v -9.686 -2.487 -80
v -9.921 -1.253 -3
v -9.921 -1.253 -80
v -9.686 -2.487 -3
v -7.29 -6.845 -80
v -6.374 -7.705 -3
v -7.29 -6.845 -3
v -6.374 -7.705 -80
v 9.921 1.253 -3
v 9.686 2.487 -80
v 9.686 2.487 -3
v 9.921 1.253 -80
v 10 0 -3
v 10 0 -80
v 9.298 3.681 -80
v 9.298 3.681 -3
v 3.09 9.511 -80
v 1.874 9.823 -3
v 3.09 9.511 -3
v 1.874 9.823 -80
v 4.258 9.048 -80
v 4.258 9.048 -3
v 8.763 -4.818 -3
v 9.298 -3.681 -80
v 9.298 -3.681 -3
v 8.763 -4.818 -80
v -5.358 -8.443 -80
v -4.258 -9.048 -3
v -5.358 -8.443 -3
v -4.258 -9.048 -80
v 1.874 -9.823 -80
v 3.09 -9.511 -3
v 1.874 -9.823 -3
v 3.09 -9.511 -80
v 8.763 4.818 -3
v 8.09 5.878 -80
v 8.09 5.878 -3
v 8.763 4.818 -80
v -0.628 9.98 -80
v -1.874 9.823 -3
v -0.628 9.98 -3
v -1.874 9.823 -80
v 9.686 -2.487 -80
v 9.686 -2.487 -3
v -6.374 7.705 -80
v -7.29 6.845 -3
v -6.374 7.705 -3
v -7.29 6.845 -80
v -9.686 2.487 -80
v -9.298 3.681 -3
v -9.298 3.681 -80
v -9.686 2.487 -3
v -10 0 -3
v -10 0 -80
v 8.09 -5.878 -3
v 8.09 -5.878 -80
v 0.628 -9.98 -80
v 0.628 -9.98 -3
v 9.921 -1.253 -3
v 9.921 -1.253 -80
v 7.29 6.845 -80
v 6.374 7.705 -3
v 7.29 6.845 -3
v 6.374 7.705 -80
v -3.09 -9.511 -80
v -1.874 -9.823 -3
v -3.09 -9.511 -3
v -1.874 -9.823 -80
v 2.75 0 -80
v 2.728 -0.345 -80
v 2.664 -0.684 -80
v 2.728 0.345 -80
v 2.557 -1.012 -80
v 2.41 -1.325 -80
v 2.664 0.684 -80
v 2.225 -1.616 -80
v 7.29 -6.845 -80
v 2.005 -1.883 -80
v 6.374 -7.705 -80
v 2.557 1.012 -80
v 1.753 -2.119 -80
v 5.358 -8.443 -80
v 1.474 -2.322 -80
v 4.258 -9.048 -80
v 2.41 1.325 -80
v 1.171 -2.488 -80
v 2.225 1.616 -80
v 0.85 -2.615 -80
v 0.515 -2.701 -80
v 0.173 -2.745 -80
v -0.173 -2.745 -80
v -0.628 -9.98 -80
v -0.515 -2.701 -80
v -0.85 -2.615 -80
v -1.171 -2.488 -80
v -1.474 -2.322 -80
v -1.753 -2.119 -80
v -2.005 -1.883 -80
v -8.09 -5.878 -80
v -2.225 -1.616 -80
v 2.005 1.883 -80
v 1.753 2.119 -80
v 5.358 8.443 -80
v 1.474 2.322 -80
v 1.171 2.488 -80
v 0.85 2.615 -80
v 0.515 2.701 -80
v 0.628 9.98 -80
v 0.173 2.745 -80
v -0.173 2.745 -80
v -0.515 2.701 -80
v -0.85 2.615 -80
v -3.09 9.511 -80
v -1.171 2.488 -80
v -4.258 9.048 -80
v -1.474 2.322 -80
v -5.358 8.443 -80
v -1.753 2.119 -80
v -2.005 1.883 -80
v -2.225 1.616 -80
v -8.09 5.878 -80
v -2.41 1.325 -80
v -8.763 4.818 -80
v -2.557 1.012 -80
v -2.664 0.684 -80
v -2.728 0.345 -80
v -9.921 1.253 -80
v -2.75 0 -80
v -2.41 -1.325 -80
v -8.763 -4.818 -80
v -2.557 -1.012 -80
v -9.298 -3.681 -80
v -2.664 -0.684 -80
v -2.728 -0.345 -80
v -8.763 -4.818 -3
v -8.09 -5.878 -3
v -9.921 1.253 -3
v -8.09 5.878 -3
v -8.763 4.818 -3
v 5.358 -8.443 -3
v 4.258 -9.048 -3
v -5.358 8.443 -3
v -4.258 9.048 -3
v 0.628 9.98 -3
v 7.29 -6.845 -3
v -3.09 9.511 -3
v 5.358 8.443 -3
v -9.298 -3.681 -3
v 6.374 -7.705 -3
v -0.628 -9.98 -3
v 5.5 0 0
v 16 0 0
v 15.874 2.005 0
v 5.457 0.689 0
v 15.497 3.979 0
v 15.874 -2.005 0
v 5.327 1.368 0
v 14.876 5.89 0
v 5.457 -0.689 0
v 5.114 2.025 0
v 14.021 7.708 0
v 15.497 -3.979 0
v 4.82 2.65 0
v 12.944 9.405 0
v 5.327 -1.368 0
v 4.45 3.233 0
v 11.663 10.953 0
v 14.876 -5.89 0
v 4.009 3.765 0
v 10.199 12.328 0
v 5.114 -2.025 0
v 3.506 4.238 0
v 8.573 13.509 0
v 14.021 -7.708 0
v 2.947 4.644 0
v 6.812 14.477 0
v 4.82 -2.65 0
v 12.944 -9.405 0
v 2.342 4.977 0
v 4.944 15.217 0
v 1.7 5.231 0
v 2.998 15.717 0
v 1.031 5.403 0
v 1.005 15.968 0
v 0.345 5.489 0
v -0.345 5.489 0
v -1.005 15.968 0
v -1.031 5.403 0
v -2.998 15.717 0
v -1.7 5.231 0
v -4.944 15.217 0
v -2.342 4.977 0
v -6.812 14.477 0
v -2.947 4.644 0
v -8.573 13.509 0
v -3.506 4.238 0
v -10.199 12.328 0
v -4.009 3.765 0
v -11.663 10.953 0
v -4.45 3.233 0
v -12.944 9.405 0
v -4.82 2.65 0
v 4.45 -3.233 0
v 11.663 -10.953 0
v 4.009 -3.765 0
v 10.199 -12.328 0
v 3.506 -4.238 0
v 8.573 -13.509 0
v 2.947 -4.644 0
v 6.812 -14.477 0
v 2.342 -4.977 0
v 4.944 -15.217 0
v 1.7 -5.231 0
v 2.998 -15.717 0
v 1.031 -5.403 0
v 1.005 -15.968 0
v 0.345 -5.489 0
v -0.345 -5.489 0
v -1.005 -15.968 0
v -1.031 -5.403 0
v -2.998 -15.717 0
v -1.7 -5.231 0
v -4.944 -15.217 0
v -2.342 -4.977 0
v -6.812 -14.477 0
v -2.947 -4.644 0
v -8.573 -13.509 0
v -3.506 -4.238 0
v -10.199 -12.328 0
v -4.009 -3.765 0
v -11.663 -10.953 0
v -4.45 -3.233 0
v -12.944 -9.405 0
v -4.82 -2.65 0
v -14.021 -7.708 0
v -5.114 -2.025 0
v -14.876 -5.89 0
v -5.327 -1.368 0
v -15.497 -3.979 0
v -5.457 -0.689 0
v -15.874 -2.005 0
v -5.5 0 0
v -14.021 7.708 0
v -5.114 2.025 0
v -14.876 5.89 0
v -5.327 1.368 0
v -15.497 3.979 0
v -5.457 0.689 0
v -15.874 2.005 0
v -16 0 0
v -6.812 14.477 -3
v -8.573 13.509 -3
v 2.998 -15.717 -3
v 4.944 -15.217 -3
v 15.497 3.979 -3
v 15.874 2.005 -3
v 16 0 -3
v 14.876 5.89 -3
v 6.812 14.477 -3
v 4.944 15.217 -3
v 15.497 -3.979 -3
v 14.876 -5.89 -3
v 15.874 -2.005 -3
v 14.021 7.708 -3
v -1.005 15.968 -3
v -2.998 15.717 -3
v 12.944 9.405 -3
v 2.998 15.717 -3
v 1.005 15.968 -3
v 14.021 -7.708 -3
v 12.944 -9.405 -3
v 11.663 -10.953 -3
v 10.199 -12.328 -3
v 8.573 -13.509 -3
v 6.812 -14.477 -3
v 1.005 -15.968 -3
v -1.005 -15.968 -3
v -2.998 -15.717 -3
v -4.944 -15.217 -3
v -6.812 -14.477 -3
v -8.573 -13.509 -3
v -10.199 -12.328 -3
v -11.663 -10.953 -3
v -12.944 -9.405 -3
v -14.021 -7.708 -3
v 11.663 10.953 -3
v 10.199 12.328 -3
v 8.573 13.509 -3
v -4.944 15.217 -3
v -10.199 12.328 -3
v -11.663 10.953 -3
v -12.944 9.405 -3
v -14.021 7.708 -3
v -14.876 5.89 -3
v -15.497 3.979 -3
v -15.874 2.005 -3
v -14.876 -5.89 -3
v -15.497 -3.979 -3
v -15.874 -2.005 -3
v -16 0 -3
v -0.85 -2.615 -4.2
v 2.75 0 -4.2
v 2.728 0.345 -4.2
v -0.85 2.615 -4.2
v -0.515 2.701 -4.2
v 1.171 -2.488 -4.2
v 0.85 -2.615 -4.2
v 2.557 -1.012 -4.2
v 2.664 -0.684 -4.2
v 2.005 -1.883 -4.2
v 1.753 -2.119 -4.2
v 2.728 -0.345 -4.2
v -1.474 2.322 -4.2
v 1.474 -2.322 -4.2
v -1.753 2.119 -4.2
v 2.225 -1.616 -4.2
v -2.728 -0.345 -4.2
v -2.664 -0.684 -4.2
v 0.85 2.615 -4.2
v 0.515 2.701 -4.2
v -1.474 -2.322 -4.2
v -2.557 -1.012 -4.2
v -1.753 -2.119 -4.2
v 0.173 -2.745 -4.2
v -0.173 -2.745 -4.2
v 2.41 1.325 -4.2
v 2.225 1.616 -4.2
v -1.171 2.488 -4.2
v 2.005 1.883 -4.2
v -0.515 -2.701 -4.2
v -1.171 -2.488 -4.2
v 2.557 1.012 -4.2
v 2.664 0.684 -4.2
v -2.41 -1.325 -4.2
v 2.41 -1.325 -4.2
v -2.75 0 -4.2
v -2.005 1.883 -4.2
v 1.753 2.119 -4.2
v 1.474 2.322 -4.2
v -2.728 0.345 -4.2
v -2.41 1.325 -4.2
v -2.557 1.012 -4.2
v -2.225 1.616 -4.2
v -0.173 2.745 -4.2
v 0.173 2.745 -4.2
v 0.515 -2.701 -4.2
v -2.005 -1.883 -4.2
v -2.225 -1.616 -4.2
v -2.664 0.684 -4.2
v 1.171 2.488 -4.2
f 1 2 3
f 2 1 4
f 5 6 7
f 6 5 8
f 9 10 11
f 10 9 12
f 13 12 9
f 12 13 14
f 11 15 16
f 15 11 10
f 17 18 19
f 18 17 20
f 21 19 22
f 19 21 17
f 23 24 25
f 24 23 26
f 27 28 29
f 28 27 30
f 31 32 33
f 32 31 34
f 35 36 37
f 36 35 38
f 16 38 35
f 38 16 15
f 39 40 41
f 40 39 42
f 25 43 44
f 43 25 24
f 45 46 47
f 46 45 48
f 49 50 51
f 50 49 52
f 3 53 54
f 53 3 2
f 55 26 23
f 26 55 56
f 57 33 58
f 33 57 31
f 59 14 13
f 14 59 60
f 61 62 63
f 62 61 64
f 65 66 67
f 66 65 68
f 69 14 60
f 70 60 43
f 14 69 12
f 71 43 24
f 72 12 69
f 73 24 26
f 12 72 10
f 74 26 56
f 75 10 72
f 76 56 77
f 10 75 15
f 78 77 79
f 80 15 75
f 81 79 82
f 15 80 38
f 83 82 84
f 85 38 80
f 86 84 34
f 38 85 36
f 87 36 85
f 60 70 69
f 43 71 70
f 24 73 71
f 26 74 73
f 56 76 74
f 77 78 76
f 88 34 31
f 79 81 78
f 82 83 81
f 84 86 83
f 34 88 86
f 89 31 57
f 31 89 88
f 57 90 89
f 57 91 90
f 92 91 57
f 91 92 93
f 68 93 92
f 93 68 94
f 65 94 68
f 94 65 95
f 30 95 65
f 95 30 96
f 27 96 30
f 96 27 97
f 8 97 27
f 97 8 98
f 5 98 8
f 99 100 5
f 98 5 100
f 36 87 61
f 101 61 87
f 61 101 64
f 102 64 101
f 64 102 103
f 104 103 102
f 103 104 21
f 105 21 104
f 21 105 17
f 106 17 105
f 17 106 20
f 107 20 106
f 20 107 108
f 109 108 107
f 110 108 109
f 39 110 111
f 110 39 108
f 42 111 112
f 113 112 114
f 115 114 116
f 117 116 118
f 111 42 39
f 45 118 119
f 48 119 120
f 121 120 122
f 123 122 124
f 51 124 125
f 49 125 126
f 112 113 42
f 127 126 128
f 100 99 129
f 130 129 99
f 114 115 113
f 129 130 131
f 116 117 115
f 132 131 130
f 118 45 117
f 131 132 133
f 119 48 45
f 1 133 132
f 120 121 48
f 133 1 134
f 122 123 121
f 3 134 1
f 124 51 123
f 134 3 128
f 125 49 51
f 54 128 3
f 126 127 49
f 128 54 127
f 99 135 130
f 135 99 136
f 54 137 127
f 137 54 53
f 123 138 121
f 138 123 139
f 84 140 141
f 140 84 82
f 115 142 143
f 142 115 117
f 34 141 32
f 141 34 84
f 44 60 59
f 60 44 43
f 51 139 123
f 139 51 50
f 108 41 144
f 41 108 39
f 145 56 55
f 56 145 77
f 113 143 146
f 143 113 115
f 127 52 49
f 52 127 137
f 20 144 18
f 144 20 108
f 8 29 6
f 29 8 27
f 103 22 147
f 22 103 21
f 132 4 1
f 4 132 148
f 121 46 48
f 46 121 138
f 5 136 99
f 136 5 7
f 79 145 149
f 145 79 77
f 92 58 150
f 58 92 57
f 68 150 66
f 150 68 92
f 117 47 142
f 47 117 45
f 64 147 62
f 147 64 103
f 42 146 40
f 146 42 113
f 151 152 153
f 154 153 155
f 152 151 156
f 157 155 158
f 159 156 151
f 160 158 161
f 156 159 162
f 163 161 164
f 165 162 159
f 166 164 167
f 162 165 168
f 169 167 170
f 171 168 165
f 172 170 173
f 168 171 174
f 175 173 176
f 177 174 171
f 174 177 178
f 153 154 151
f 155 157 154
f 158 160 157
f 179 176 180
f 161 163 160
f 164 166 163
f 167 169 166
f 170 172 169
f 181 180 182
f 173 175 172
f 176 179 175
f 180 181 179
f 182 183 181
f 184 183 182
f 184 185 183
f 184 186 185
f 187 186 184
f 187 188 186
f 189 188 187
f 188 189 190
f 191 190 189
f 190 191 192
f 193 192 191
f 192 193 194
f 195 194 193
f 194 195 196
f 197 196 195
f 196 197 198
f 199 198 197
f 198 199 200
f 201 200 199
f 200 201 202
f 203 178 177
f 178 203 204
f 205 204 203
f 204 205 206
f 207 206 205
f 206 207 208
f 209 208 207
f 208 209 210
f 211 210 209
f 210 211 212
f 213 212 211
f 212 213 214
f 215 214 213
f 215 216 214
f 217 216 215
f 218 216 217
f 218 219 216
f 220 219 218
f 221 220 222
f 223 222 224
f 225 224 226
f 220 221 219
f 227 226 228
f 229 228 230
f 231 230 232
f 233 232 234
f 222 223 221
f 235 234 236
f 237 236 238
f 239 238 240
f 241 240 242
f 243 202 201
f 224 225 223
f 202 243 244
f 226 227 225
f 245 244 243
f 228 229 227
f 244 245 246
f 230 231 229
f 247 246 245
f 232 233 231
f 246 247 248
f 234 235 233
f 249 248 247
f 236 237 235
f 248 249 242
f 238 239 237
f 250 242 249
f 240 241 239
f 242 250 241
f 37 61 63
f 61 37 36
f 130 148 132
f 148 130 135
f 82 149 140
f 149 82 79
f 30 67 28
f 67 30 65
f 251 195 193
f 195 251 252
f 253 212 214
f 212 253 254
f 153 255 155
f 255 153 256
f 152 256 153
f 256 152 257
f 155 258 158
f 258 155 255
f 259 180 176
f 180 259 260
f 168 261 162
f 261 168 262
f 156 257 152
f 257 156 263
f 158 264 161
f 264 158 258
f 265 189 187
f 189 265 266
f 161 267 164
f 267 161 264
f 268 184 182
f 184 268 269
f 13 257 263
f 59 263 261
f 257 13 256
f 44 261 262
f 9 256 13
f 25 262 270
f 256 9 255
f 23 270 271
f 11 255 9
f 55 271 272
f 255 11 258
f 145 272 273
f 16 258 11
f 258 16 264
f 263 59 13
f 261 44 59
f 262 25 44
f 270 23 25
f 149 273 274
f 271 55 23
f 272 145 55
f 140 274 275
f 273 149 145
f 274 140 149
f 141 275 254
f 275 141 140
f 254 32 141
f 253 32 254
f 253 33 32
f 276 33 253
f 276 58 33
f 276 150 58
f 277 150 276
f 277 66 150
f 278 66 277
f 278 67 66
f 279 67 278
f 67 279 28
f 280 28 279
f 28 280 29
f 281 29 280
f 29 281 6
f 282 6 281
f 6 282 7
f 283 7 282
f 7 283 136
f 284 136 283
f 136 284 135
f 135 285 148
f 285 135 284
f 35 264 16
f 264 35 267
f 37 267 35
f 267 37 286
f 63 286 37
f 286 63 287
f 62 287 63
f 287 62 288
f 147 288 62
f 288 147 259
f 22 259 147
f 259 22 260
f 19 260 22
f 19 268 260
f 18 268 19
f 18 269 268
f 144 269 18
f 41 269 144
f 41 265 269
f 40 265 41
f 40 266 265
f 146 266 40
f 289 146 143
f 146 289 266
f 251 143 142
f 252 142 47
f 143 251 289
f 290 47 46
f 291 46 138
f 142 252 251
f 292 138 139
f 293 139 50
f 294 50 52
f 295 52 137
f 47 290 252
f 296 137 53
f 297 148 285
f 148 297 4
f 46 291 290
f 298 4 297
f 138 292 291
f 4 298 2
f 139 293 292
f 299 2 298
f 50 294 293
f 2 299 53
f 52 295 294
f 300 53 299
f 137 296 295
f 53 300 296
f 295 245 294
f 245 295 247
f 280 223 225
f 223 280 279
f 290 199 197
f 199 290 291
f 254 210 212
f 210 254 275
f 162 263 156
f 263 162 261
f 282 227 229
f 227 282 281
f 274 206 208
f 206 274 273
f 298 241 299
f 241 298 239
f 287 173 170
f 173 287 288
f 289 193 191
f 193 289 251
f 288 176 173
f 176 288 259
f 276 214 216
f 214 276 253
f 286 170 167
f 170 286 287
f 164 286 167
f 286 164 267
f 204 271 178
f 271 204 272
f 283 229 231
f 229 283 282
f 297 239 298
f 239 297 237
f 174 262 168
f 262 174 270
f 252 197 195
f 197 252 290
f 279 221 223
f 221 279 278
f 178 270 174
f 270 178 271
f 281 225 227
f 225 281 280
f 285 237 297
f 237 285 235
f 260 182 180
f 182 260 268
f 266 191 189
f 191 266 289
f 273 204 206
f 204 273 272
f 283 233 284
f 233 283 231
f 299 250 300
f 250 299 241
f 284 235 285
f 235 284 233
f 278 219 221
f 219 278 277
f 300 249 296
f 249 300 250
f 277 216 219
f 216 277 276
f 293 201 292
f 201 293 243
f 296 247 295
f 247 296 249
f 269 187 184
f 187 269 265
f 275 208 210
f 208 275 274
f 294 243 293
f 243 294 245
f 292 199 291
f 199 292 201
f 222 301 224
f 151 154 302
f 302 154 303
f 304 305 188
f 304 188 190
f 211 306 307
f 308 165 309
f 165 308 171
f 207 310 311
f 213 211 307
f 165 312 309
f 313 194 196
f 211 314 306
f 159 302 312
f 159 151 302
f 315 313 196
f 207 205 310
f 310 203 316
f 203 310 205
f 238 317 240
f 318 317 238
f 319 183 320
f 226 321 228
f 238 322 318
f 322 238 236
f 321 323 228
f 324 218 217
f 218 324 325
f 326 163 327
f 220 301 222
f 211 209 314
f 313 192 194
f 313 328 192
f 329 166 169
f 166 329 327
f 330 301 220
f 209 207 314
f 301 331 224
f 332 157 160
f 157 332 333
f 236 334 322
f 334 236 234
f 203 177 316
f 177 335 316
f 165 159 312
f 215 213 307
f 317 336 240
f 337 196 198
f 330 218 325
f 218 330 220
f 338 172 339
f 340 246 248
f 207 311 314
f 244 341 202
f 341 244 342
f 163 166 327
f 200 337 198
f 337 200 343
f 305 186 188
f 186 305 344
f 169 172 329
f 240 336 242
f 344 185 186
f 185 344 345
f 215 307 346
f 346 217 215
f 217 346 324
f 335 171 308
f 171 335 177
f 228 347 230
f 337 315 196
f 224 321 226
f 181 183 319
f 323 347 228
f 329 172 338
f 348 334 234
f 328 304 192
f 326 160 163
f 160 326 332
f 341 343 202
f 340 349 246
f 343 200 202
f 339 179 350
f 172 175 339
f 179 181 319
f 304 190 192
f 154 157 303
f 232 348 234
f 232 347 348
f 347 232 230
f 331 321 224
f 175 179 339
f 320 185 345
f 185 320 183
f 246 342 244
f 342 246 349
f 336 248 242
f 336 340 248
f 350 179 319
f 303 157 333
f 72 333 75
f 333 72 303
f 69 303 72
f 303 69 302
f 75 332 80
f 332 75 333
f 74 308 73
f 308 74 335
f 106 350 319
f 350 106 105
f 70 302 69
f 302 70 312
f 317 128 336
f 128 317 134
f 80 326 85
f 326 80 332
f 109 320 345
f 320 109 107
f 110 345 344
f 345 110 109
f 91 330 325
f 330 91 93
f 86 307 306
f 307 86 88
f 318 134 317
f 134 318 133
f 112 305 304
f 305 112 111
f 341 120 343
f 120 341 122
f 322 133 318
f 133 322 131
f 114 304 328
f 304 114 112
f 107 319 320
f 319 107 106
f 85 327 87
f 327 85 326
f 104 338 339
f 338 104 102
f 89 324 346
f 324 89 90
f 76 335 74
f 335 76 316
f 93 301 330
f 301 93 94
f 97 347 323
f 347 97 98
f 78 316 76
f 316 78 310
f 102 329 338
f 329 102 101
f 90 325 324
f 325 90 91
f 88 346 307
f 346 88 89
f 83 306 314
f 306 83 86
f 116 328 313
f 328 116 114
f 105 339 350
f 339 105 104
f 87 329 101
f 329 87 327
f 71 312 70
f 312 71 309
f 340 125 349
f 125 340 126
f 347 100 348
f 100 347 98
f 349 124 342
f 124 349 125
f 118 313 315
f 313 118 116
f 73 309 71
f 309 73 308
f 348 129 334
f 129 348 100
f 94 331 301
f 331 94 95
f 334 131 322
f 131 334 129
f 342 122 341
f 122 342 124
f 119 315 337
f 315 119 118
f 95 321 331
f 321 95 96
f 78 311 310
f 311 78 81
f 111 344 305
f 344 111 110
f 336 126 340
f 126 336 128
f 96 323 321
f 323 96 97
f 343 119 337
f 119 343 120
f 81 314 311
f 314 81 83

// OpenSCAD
$fn = 50;


difference() {
	union() {
		translate(v = [0, 0, -80.0000000000]) {
			cylinder(h = 80, r = 10.0000000000);
		}
		translate(v = [0, 0, -3.0000000000]) {
			cylinder(h = 3, r = 16.0000000000);
		}
	}
	union() {
		translate(v = [0, 0, 0]) {
			rotate(a = [0, 0, 0]) {
				difference() {
					union() {
						#translate(v = [0, 0, -80.0000000000]) {
							cylinder(h = 80, r = 2.2500000000);
						}
						#translate(v = [0, 0, -4.2000000000]) {
							cylinder(h = 4.2000000000, r = 10.0000000000, r1 = 2.7500000000, r2 = 5.5000000000);
						}
						#translate(v = [0, 0, -80.0000000000]) {
							cylinder(h = 80, r = 2.7500000000);
						}
						#translate(v = [0, 0, -80.0000000000]) {
							cylinder(h = 80, r = 2.2500000000);
						}
					}
					union();
				}
			}
		}
	}
}
